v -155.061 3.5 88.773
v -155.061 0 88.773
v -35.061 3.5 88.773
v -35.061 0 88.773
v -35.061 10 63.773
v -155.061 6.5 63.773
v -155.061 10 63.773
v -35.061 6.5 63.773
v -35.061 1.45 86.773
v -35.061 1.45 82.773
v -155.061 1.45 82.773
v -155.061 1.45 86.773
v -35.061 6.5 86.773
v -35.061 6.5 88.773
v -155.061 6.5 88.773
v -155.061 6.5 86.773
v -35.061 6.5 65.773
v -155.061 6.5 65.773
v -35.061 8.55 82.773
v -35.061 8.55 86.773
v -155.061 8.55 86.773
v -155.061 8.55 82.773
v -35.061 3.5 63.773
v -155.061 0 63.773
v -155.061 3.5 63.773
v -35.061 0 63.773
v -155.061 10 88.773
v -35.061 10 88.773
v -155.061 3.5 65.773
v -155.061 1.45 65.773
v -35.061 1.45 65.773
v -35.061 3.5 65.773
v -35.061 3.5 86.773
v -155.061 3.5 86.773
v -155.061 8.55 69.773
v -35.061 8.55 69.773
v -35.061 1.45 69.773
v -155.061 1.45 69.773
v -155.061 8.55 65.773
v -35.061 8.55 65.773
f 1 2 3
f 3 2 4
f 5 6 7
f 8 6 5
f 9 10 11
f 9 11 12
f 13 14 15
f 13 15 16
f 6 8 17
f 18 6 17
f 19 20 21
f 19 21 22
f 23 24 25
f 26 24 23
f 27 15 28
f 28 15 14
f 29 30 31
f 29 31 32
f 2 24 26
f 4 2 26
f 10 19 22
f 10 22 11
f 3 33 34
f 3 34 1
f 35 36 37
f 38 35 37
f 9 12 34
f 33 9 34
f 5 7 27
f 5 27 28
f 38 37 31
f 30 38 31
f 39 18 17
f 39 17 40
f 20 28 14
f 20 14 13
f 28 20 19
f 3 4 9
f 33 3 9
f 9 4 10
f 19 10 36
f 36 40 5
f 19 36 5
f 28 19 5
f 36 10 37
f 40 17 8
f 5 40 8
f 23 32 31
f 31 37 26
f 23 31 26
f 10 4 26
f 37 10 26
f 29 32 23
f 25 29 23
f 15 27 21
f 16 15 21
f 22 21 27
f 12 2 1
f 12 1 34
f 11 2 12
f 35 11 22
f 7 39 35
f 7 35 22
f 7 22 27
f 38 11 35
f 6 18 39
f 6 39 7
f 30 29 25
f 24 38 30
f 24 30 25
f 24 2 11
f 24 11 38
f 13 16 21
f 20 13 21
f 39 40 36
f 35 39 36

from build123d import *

# Parameters (mm, degrees)
SKETCH1_W           = 120
SKETCH1_H           = 25
BOSS_EXTRUDE1_DEPTH = 10
CUT_EXTRUDE1_DEPTH  = 120
CUT_EXTRUDE2_DEPTH  = 120


with BuildPart() as part:
    # Sketch1 → Boss-Extrude1 (new body)
    with BuildSketch(Plane(origin=(0, 0, 0), x_dir=(1, 0, 0), z_dir=(0, 1, 0))):
        with Locations((-95.061127507, -76.27261395)):
            Rectangle(SKETCH1_W, SKETCH1_H)
    extrude(amount=BOSS_EXTRUDE1_DEPTH)

    # Sketch2 → Cut-Extrude1 (cut)
    with BuildSketch(Plane(origin=(-35.061127507, 0, 0), x_dir=(0, 0, -1), z_dir=(1, 0, 0))):
        Polygon((-63.77261395, 6.5), (-65.77261395, 6.5), (-65.77261395, 8.55), (-69.77261395, 8.55), (-69.77261395, 1.45), (-65.77261395, 1.45), (-65.77261395, 3.5), (-63.77261395, 3.5), align=None)
    extrude(amount=-CUT_EXTRUDE1_DEPTH, mode=Mode.SUBTRACT)

    # Sketch3 → Cut-Extrude2 (cut)
    with BuildSketch(Plane(origin=(-35.061127507, 0, 0), x_dir=(0, 0, -1), z_dir=(1, 0, 0))):
        Polygon((-88.77261395, 6.5), (-86.77261395, 6.5), (-86.77261395, 8.55), (-82.77261395, 8.55), (-82.77261395, 1.45), (-86.77261395, 1.45), (-86.77261395, 3.5), (-88.77261395, 3.5), align=None)
    extrude(amount=-CUT_EXTRUDE2_DEPTH, mode=Mode.SUBTRACT)


solid = part.part
